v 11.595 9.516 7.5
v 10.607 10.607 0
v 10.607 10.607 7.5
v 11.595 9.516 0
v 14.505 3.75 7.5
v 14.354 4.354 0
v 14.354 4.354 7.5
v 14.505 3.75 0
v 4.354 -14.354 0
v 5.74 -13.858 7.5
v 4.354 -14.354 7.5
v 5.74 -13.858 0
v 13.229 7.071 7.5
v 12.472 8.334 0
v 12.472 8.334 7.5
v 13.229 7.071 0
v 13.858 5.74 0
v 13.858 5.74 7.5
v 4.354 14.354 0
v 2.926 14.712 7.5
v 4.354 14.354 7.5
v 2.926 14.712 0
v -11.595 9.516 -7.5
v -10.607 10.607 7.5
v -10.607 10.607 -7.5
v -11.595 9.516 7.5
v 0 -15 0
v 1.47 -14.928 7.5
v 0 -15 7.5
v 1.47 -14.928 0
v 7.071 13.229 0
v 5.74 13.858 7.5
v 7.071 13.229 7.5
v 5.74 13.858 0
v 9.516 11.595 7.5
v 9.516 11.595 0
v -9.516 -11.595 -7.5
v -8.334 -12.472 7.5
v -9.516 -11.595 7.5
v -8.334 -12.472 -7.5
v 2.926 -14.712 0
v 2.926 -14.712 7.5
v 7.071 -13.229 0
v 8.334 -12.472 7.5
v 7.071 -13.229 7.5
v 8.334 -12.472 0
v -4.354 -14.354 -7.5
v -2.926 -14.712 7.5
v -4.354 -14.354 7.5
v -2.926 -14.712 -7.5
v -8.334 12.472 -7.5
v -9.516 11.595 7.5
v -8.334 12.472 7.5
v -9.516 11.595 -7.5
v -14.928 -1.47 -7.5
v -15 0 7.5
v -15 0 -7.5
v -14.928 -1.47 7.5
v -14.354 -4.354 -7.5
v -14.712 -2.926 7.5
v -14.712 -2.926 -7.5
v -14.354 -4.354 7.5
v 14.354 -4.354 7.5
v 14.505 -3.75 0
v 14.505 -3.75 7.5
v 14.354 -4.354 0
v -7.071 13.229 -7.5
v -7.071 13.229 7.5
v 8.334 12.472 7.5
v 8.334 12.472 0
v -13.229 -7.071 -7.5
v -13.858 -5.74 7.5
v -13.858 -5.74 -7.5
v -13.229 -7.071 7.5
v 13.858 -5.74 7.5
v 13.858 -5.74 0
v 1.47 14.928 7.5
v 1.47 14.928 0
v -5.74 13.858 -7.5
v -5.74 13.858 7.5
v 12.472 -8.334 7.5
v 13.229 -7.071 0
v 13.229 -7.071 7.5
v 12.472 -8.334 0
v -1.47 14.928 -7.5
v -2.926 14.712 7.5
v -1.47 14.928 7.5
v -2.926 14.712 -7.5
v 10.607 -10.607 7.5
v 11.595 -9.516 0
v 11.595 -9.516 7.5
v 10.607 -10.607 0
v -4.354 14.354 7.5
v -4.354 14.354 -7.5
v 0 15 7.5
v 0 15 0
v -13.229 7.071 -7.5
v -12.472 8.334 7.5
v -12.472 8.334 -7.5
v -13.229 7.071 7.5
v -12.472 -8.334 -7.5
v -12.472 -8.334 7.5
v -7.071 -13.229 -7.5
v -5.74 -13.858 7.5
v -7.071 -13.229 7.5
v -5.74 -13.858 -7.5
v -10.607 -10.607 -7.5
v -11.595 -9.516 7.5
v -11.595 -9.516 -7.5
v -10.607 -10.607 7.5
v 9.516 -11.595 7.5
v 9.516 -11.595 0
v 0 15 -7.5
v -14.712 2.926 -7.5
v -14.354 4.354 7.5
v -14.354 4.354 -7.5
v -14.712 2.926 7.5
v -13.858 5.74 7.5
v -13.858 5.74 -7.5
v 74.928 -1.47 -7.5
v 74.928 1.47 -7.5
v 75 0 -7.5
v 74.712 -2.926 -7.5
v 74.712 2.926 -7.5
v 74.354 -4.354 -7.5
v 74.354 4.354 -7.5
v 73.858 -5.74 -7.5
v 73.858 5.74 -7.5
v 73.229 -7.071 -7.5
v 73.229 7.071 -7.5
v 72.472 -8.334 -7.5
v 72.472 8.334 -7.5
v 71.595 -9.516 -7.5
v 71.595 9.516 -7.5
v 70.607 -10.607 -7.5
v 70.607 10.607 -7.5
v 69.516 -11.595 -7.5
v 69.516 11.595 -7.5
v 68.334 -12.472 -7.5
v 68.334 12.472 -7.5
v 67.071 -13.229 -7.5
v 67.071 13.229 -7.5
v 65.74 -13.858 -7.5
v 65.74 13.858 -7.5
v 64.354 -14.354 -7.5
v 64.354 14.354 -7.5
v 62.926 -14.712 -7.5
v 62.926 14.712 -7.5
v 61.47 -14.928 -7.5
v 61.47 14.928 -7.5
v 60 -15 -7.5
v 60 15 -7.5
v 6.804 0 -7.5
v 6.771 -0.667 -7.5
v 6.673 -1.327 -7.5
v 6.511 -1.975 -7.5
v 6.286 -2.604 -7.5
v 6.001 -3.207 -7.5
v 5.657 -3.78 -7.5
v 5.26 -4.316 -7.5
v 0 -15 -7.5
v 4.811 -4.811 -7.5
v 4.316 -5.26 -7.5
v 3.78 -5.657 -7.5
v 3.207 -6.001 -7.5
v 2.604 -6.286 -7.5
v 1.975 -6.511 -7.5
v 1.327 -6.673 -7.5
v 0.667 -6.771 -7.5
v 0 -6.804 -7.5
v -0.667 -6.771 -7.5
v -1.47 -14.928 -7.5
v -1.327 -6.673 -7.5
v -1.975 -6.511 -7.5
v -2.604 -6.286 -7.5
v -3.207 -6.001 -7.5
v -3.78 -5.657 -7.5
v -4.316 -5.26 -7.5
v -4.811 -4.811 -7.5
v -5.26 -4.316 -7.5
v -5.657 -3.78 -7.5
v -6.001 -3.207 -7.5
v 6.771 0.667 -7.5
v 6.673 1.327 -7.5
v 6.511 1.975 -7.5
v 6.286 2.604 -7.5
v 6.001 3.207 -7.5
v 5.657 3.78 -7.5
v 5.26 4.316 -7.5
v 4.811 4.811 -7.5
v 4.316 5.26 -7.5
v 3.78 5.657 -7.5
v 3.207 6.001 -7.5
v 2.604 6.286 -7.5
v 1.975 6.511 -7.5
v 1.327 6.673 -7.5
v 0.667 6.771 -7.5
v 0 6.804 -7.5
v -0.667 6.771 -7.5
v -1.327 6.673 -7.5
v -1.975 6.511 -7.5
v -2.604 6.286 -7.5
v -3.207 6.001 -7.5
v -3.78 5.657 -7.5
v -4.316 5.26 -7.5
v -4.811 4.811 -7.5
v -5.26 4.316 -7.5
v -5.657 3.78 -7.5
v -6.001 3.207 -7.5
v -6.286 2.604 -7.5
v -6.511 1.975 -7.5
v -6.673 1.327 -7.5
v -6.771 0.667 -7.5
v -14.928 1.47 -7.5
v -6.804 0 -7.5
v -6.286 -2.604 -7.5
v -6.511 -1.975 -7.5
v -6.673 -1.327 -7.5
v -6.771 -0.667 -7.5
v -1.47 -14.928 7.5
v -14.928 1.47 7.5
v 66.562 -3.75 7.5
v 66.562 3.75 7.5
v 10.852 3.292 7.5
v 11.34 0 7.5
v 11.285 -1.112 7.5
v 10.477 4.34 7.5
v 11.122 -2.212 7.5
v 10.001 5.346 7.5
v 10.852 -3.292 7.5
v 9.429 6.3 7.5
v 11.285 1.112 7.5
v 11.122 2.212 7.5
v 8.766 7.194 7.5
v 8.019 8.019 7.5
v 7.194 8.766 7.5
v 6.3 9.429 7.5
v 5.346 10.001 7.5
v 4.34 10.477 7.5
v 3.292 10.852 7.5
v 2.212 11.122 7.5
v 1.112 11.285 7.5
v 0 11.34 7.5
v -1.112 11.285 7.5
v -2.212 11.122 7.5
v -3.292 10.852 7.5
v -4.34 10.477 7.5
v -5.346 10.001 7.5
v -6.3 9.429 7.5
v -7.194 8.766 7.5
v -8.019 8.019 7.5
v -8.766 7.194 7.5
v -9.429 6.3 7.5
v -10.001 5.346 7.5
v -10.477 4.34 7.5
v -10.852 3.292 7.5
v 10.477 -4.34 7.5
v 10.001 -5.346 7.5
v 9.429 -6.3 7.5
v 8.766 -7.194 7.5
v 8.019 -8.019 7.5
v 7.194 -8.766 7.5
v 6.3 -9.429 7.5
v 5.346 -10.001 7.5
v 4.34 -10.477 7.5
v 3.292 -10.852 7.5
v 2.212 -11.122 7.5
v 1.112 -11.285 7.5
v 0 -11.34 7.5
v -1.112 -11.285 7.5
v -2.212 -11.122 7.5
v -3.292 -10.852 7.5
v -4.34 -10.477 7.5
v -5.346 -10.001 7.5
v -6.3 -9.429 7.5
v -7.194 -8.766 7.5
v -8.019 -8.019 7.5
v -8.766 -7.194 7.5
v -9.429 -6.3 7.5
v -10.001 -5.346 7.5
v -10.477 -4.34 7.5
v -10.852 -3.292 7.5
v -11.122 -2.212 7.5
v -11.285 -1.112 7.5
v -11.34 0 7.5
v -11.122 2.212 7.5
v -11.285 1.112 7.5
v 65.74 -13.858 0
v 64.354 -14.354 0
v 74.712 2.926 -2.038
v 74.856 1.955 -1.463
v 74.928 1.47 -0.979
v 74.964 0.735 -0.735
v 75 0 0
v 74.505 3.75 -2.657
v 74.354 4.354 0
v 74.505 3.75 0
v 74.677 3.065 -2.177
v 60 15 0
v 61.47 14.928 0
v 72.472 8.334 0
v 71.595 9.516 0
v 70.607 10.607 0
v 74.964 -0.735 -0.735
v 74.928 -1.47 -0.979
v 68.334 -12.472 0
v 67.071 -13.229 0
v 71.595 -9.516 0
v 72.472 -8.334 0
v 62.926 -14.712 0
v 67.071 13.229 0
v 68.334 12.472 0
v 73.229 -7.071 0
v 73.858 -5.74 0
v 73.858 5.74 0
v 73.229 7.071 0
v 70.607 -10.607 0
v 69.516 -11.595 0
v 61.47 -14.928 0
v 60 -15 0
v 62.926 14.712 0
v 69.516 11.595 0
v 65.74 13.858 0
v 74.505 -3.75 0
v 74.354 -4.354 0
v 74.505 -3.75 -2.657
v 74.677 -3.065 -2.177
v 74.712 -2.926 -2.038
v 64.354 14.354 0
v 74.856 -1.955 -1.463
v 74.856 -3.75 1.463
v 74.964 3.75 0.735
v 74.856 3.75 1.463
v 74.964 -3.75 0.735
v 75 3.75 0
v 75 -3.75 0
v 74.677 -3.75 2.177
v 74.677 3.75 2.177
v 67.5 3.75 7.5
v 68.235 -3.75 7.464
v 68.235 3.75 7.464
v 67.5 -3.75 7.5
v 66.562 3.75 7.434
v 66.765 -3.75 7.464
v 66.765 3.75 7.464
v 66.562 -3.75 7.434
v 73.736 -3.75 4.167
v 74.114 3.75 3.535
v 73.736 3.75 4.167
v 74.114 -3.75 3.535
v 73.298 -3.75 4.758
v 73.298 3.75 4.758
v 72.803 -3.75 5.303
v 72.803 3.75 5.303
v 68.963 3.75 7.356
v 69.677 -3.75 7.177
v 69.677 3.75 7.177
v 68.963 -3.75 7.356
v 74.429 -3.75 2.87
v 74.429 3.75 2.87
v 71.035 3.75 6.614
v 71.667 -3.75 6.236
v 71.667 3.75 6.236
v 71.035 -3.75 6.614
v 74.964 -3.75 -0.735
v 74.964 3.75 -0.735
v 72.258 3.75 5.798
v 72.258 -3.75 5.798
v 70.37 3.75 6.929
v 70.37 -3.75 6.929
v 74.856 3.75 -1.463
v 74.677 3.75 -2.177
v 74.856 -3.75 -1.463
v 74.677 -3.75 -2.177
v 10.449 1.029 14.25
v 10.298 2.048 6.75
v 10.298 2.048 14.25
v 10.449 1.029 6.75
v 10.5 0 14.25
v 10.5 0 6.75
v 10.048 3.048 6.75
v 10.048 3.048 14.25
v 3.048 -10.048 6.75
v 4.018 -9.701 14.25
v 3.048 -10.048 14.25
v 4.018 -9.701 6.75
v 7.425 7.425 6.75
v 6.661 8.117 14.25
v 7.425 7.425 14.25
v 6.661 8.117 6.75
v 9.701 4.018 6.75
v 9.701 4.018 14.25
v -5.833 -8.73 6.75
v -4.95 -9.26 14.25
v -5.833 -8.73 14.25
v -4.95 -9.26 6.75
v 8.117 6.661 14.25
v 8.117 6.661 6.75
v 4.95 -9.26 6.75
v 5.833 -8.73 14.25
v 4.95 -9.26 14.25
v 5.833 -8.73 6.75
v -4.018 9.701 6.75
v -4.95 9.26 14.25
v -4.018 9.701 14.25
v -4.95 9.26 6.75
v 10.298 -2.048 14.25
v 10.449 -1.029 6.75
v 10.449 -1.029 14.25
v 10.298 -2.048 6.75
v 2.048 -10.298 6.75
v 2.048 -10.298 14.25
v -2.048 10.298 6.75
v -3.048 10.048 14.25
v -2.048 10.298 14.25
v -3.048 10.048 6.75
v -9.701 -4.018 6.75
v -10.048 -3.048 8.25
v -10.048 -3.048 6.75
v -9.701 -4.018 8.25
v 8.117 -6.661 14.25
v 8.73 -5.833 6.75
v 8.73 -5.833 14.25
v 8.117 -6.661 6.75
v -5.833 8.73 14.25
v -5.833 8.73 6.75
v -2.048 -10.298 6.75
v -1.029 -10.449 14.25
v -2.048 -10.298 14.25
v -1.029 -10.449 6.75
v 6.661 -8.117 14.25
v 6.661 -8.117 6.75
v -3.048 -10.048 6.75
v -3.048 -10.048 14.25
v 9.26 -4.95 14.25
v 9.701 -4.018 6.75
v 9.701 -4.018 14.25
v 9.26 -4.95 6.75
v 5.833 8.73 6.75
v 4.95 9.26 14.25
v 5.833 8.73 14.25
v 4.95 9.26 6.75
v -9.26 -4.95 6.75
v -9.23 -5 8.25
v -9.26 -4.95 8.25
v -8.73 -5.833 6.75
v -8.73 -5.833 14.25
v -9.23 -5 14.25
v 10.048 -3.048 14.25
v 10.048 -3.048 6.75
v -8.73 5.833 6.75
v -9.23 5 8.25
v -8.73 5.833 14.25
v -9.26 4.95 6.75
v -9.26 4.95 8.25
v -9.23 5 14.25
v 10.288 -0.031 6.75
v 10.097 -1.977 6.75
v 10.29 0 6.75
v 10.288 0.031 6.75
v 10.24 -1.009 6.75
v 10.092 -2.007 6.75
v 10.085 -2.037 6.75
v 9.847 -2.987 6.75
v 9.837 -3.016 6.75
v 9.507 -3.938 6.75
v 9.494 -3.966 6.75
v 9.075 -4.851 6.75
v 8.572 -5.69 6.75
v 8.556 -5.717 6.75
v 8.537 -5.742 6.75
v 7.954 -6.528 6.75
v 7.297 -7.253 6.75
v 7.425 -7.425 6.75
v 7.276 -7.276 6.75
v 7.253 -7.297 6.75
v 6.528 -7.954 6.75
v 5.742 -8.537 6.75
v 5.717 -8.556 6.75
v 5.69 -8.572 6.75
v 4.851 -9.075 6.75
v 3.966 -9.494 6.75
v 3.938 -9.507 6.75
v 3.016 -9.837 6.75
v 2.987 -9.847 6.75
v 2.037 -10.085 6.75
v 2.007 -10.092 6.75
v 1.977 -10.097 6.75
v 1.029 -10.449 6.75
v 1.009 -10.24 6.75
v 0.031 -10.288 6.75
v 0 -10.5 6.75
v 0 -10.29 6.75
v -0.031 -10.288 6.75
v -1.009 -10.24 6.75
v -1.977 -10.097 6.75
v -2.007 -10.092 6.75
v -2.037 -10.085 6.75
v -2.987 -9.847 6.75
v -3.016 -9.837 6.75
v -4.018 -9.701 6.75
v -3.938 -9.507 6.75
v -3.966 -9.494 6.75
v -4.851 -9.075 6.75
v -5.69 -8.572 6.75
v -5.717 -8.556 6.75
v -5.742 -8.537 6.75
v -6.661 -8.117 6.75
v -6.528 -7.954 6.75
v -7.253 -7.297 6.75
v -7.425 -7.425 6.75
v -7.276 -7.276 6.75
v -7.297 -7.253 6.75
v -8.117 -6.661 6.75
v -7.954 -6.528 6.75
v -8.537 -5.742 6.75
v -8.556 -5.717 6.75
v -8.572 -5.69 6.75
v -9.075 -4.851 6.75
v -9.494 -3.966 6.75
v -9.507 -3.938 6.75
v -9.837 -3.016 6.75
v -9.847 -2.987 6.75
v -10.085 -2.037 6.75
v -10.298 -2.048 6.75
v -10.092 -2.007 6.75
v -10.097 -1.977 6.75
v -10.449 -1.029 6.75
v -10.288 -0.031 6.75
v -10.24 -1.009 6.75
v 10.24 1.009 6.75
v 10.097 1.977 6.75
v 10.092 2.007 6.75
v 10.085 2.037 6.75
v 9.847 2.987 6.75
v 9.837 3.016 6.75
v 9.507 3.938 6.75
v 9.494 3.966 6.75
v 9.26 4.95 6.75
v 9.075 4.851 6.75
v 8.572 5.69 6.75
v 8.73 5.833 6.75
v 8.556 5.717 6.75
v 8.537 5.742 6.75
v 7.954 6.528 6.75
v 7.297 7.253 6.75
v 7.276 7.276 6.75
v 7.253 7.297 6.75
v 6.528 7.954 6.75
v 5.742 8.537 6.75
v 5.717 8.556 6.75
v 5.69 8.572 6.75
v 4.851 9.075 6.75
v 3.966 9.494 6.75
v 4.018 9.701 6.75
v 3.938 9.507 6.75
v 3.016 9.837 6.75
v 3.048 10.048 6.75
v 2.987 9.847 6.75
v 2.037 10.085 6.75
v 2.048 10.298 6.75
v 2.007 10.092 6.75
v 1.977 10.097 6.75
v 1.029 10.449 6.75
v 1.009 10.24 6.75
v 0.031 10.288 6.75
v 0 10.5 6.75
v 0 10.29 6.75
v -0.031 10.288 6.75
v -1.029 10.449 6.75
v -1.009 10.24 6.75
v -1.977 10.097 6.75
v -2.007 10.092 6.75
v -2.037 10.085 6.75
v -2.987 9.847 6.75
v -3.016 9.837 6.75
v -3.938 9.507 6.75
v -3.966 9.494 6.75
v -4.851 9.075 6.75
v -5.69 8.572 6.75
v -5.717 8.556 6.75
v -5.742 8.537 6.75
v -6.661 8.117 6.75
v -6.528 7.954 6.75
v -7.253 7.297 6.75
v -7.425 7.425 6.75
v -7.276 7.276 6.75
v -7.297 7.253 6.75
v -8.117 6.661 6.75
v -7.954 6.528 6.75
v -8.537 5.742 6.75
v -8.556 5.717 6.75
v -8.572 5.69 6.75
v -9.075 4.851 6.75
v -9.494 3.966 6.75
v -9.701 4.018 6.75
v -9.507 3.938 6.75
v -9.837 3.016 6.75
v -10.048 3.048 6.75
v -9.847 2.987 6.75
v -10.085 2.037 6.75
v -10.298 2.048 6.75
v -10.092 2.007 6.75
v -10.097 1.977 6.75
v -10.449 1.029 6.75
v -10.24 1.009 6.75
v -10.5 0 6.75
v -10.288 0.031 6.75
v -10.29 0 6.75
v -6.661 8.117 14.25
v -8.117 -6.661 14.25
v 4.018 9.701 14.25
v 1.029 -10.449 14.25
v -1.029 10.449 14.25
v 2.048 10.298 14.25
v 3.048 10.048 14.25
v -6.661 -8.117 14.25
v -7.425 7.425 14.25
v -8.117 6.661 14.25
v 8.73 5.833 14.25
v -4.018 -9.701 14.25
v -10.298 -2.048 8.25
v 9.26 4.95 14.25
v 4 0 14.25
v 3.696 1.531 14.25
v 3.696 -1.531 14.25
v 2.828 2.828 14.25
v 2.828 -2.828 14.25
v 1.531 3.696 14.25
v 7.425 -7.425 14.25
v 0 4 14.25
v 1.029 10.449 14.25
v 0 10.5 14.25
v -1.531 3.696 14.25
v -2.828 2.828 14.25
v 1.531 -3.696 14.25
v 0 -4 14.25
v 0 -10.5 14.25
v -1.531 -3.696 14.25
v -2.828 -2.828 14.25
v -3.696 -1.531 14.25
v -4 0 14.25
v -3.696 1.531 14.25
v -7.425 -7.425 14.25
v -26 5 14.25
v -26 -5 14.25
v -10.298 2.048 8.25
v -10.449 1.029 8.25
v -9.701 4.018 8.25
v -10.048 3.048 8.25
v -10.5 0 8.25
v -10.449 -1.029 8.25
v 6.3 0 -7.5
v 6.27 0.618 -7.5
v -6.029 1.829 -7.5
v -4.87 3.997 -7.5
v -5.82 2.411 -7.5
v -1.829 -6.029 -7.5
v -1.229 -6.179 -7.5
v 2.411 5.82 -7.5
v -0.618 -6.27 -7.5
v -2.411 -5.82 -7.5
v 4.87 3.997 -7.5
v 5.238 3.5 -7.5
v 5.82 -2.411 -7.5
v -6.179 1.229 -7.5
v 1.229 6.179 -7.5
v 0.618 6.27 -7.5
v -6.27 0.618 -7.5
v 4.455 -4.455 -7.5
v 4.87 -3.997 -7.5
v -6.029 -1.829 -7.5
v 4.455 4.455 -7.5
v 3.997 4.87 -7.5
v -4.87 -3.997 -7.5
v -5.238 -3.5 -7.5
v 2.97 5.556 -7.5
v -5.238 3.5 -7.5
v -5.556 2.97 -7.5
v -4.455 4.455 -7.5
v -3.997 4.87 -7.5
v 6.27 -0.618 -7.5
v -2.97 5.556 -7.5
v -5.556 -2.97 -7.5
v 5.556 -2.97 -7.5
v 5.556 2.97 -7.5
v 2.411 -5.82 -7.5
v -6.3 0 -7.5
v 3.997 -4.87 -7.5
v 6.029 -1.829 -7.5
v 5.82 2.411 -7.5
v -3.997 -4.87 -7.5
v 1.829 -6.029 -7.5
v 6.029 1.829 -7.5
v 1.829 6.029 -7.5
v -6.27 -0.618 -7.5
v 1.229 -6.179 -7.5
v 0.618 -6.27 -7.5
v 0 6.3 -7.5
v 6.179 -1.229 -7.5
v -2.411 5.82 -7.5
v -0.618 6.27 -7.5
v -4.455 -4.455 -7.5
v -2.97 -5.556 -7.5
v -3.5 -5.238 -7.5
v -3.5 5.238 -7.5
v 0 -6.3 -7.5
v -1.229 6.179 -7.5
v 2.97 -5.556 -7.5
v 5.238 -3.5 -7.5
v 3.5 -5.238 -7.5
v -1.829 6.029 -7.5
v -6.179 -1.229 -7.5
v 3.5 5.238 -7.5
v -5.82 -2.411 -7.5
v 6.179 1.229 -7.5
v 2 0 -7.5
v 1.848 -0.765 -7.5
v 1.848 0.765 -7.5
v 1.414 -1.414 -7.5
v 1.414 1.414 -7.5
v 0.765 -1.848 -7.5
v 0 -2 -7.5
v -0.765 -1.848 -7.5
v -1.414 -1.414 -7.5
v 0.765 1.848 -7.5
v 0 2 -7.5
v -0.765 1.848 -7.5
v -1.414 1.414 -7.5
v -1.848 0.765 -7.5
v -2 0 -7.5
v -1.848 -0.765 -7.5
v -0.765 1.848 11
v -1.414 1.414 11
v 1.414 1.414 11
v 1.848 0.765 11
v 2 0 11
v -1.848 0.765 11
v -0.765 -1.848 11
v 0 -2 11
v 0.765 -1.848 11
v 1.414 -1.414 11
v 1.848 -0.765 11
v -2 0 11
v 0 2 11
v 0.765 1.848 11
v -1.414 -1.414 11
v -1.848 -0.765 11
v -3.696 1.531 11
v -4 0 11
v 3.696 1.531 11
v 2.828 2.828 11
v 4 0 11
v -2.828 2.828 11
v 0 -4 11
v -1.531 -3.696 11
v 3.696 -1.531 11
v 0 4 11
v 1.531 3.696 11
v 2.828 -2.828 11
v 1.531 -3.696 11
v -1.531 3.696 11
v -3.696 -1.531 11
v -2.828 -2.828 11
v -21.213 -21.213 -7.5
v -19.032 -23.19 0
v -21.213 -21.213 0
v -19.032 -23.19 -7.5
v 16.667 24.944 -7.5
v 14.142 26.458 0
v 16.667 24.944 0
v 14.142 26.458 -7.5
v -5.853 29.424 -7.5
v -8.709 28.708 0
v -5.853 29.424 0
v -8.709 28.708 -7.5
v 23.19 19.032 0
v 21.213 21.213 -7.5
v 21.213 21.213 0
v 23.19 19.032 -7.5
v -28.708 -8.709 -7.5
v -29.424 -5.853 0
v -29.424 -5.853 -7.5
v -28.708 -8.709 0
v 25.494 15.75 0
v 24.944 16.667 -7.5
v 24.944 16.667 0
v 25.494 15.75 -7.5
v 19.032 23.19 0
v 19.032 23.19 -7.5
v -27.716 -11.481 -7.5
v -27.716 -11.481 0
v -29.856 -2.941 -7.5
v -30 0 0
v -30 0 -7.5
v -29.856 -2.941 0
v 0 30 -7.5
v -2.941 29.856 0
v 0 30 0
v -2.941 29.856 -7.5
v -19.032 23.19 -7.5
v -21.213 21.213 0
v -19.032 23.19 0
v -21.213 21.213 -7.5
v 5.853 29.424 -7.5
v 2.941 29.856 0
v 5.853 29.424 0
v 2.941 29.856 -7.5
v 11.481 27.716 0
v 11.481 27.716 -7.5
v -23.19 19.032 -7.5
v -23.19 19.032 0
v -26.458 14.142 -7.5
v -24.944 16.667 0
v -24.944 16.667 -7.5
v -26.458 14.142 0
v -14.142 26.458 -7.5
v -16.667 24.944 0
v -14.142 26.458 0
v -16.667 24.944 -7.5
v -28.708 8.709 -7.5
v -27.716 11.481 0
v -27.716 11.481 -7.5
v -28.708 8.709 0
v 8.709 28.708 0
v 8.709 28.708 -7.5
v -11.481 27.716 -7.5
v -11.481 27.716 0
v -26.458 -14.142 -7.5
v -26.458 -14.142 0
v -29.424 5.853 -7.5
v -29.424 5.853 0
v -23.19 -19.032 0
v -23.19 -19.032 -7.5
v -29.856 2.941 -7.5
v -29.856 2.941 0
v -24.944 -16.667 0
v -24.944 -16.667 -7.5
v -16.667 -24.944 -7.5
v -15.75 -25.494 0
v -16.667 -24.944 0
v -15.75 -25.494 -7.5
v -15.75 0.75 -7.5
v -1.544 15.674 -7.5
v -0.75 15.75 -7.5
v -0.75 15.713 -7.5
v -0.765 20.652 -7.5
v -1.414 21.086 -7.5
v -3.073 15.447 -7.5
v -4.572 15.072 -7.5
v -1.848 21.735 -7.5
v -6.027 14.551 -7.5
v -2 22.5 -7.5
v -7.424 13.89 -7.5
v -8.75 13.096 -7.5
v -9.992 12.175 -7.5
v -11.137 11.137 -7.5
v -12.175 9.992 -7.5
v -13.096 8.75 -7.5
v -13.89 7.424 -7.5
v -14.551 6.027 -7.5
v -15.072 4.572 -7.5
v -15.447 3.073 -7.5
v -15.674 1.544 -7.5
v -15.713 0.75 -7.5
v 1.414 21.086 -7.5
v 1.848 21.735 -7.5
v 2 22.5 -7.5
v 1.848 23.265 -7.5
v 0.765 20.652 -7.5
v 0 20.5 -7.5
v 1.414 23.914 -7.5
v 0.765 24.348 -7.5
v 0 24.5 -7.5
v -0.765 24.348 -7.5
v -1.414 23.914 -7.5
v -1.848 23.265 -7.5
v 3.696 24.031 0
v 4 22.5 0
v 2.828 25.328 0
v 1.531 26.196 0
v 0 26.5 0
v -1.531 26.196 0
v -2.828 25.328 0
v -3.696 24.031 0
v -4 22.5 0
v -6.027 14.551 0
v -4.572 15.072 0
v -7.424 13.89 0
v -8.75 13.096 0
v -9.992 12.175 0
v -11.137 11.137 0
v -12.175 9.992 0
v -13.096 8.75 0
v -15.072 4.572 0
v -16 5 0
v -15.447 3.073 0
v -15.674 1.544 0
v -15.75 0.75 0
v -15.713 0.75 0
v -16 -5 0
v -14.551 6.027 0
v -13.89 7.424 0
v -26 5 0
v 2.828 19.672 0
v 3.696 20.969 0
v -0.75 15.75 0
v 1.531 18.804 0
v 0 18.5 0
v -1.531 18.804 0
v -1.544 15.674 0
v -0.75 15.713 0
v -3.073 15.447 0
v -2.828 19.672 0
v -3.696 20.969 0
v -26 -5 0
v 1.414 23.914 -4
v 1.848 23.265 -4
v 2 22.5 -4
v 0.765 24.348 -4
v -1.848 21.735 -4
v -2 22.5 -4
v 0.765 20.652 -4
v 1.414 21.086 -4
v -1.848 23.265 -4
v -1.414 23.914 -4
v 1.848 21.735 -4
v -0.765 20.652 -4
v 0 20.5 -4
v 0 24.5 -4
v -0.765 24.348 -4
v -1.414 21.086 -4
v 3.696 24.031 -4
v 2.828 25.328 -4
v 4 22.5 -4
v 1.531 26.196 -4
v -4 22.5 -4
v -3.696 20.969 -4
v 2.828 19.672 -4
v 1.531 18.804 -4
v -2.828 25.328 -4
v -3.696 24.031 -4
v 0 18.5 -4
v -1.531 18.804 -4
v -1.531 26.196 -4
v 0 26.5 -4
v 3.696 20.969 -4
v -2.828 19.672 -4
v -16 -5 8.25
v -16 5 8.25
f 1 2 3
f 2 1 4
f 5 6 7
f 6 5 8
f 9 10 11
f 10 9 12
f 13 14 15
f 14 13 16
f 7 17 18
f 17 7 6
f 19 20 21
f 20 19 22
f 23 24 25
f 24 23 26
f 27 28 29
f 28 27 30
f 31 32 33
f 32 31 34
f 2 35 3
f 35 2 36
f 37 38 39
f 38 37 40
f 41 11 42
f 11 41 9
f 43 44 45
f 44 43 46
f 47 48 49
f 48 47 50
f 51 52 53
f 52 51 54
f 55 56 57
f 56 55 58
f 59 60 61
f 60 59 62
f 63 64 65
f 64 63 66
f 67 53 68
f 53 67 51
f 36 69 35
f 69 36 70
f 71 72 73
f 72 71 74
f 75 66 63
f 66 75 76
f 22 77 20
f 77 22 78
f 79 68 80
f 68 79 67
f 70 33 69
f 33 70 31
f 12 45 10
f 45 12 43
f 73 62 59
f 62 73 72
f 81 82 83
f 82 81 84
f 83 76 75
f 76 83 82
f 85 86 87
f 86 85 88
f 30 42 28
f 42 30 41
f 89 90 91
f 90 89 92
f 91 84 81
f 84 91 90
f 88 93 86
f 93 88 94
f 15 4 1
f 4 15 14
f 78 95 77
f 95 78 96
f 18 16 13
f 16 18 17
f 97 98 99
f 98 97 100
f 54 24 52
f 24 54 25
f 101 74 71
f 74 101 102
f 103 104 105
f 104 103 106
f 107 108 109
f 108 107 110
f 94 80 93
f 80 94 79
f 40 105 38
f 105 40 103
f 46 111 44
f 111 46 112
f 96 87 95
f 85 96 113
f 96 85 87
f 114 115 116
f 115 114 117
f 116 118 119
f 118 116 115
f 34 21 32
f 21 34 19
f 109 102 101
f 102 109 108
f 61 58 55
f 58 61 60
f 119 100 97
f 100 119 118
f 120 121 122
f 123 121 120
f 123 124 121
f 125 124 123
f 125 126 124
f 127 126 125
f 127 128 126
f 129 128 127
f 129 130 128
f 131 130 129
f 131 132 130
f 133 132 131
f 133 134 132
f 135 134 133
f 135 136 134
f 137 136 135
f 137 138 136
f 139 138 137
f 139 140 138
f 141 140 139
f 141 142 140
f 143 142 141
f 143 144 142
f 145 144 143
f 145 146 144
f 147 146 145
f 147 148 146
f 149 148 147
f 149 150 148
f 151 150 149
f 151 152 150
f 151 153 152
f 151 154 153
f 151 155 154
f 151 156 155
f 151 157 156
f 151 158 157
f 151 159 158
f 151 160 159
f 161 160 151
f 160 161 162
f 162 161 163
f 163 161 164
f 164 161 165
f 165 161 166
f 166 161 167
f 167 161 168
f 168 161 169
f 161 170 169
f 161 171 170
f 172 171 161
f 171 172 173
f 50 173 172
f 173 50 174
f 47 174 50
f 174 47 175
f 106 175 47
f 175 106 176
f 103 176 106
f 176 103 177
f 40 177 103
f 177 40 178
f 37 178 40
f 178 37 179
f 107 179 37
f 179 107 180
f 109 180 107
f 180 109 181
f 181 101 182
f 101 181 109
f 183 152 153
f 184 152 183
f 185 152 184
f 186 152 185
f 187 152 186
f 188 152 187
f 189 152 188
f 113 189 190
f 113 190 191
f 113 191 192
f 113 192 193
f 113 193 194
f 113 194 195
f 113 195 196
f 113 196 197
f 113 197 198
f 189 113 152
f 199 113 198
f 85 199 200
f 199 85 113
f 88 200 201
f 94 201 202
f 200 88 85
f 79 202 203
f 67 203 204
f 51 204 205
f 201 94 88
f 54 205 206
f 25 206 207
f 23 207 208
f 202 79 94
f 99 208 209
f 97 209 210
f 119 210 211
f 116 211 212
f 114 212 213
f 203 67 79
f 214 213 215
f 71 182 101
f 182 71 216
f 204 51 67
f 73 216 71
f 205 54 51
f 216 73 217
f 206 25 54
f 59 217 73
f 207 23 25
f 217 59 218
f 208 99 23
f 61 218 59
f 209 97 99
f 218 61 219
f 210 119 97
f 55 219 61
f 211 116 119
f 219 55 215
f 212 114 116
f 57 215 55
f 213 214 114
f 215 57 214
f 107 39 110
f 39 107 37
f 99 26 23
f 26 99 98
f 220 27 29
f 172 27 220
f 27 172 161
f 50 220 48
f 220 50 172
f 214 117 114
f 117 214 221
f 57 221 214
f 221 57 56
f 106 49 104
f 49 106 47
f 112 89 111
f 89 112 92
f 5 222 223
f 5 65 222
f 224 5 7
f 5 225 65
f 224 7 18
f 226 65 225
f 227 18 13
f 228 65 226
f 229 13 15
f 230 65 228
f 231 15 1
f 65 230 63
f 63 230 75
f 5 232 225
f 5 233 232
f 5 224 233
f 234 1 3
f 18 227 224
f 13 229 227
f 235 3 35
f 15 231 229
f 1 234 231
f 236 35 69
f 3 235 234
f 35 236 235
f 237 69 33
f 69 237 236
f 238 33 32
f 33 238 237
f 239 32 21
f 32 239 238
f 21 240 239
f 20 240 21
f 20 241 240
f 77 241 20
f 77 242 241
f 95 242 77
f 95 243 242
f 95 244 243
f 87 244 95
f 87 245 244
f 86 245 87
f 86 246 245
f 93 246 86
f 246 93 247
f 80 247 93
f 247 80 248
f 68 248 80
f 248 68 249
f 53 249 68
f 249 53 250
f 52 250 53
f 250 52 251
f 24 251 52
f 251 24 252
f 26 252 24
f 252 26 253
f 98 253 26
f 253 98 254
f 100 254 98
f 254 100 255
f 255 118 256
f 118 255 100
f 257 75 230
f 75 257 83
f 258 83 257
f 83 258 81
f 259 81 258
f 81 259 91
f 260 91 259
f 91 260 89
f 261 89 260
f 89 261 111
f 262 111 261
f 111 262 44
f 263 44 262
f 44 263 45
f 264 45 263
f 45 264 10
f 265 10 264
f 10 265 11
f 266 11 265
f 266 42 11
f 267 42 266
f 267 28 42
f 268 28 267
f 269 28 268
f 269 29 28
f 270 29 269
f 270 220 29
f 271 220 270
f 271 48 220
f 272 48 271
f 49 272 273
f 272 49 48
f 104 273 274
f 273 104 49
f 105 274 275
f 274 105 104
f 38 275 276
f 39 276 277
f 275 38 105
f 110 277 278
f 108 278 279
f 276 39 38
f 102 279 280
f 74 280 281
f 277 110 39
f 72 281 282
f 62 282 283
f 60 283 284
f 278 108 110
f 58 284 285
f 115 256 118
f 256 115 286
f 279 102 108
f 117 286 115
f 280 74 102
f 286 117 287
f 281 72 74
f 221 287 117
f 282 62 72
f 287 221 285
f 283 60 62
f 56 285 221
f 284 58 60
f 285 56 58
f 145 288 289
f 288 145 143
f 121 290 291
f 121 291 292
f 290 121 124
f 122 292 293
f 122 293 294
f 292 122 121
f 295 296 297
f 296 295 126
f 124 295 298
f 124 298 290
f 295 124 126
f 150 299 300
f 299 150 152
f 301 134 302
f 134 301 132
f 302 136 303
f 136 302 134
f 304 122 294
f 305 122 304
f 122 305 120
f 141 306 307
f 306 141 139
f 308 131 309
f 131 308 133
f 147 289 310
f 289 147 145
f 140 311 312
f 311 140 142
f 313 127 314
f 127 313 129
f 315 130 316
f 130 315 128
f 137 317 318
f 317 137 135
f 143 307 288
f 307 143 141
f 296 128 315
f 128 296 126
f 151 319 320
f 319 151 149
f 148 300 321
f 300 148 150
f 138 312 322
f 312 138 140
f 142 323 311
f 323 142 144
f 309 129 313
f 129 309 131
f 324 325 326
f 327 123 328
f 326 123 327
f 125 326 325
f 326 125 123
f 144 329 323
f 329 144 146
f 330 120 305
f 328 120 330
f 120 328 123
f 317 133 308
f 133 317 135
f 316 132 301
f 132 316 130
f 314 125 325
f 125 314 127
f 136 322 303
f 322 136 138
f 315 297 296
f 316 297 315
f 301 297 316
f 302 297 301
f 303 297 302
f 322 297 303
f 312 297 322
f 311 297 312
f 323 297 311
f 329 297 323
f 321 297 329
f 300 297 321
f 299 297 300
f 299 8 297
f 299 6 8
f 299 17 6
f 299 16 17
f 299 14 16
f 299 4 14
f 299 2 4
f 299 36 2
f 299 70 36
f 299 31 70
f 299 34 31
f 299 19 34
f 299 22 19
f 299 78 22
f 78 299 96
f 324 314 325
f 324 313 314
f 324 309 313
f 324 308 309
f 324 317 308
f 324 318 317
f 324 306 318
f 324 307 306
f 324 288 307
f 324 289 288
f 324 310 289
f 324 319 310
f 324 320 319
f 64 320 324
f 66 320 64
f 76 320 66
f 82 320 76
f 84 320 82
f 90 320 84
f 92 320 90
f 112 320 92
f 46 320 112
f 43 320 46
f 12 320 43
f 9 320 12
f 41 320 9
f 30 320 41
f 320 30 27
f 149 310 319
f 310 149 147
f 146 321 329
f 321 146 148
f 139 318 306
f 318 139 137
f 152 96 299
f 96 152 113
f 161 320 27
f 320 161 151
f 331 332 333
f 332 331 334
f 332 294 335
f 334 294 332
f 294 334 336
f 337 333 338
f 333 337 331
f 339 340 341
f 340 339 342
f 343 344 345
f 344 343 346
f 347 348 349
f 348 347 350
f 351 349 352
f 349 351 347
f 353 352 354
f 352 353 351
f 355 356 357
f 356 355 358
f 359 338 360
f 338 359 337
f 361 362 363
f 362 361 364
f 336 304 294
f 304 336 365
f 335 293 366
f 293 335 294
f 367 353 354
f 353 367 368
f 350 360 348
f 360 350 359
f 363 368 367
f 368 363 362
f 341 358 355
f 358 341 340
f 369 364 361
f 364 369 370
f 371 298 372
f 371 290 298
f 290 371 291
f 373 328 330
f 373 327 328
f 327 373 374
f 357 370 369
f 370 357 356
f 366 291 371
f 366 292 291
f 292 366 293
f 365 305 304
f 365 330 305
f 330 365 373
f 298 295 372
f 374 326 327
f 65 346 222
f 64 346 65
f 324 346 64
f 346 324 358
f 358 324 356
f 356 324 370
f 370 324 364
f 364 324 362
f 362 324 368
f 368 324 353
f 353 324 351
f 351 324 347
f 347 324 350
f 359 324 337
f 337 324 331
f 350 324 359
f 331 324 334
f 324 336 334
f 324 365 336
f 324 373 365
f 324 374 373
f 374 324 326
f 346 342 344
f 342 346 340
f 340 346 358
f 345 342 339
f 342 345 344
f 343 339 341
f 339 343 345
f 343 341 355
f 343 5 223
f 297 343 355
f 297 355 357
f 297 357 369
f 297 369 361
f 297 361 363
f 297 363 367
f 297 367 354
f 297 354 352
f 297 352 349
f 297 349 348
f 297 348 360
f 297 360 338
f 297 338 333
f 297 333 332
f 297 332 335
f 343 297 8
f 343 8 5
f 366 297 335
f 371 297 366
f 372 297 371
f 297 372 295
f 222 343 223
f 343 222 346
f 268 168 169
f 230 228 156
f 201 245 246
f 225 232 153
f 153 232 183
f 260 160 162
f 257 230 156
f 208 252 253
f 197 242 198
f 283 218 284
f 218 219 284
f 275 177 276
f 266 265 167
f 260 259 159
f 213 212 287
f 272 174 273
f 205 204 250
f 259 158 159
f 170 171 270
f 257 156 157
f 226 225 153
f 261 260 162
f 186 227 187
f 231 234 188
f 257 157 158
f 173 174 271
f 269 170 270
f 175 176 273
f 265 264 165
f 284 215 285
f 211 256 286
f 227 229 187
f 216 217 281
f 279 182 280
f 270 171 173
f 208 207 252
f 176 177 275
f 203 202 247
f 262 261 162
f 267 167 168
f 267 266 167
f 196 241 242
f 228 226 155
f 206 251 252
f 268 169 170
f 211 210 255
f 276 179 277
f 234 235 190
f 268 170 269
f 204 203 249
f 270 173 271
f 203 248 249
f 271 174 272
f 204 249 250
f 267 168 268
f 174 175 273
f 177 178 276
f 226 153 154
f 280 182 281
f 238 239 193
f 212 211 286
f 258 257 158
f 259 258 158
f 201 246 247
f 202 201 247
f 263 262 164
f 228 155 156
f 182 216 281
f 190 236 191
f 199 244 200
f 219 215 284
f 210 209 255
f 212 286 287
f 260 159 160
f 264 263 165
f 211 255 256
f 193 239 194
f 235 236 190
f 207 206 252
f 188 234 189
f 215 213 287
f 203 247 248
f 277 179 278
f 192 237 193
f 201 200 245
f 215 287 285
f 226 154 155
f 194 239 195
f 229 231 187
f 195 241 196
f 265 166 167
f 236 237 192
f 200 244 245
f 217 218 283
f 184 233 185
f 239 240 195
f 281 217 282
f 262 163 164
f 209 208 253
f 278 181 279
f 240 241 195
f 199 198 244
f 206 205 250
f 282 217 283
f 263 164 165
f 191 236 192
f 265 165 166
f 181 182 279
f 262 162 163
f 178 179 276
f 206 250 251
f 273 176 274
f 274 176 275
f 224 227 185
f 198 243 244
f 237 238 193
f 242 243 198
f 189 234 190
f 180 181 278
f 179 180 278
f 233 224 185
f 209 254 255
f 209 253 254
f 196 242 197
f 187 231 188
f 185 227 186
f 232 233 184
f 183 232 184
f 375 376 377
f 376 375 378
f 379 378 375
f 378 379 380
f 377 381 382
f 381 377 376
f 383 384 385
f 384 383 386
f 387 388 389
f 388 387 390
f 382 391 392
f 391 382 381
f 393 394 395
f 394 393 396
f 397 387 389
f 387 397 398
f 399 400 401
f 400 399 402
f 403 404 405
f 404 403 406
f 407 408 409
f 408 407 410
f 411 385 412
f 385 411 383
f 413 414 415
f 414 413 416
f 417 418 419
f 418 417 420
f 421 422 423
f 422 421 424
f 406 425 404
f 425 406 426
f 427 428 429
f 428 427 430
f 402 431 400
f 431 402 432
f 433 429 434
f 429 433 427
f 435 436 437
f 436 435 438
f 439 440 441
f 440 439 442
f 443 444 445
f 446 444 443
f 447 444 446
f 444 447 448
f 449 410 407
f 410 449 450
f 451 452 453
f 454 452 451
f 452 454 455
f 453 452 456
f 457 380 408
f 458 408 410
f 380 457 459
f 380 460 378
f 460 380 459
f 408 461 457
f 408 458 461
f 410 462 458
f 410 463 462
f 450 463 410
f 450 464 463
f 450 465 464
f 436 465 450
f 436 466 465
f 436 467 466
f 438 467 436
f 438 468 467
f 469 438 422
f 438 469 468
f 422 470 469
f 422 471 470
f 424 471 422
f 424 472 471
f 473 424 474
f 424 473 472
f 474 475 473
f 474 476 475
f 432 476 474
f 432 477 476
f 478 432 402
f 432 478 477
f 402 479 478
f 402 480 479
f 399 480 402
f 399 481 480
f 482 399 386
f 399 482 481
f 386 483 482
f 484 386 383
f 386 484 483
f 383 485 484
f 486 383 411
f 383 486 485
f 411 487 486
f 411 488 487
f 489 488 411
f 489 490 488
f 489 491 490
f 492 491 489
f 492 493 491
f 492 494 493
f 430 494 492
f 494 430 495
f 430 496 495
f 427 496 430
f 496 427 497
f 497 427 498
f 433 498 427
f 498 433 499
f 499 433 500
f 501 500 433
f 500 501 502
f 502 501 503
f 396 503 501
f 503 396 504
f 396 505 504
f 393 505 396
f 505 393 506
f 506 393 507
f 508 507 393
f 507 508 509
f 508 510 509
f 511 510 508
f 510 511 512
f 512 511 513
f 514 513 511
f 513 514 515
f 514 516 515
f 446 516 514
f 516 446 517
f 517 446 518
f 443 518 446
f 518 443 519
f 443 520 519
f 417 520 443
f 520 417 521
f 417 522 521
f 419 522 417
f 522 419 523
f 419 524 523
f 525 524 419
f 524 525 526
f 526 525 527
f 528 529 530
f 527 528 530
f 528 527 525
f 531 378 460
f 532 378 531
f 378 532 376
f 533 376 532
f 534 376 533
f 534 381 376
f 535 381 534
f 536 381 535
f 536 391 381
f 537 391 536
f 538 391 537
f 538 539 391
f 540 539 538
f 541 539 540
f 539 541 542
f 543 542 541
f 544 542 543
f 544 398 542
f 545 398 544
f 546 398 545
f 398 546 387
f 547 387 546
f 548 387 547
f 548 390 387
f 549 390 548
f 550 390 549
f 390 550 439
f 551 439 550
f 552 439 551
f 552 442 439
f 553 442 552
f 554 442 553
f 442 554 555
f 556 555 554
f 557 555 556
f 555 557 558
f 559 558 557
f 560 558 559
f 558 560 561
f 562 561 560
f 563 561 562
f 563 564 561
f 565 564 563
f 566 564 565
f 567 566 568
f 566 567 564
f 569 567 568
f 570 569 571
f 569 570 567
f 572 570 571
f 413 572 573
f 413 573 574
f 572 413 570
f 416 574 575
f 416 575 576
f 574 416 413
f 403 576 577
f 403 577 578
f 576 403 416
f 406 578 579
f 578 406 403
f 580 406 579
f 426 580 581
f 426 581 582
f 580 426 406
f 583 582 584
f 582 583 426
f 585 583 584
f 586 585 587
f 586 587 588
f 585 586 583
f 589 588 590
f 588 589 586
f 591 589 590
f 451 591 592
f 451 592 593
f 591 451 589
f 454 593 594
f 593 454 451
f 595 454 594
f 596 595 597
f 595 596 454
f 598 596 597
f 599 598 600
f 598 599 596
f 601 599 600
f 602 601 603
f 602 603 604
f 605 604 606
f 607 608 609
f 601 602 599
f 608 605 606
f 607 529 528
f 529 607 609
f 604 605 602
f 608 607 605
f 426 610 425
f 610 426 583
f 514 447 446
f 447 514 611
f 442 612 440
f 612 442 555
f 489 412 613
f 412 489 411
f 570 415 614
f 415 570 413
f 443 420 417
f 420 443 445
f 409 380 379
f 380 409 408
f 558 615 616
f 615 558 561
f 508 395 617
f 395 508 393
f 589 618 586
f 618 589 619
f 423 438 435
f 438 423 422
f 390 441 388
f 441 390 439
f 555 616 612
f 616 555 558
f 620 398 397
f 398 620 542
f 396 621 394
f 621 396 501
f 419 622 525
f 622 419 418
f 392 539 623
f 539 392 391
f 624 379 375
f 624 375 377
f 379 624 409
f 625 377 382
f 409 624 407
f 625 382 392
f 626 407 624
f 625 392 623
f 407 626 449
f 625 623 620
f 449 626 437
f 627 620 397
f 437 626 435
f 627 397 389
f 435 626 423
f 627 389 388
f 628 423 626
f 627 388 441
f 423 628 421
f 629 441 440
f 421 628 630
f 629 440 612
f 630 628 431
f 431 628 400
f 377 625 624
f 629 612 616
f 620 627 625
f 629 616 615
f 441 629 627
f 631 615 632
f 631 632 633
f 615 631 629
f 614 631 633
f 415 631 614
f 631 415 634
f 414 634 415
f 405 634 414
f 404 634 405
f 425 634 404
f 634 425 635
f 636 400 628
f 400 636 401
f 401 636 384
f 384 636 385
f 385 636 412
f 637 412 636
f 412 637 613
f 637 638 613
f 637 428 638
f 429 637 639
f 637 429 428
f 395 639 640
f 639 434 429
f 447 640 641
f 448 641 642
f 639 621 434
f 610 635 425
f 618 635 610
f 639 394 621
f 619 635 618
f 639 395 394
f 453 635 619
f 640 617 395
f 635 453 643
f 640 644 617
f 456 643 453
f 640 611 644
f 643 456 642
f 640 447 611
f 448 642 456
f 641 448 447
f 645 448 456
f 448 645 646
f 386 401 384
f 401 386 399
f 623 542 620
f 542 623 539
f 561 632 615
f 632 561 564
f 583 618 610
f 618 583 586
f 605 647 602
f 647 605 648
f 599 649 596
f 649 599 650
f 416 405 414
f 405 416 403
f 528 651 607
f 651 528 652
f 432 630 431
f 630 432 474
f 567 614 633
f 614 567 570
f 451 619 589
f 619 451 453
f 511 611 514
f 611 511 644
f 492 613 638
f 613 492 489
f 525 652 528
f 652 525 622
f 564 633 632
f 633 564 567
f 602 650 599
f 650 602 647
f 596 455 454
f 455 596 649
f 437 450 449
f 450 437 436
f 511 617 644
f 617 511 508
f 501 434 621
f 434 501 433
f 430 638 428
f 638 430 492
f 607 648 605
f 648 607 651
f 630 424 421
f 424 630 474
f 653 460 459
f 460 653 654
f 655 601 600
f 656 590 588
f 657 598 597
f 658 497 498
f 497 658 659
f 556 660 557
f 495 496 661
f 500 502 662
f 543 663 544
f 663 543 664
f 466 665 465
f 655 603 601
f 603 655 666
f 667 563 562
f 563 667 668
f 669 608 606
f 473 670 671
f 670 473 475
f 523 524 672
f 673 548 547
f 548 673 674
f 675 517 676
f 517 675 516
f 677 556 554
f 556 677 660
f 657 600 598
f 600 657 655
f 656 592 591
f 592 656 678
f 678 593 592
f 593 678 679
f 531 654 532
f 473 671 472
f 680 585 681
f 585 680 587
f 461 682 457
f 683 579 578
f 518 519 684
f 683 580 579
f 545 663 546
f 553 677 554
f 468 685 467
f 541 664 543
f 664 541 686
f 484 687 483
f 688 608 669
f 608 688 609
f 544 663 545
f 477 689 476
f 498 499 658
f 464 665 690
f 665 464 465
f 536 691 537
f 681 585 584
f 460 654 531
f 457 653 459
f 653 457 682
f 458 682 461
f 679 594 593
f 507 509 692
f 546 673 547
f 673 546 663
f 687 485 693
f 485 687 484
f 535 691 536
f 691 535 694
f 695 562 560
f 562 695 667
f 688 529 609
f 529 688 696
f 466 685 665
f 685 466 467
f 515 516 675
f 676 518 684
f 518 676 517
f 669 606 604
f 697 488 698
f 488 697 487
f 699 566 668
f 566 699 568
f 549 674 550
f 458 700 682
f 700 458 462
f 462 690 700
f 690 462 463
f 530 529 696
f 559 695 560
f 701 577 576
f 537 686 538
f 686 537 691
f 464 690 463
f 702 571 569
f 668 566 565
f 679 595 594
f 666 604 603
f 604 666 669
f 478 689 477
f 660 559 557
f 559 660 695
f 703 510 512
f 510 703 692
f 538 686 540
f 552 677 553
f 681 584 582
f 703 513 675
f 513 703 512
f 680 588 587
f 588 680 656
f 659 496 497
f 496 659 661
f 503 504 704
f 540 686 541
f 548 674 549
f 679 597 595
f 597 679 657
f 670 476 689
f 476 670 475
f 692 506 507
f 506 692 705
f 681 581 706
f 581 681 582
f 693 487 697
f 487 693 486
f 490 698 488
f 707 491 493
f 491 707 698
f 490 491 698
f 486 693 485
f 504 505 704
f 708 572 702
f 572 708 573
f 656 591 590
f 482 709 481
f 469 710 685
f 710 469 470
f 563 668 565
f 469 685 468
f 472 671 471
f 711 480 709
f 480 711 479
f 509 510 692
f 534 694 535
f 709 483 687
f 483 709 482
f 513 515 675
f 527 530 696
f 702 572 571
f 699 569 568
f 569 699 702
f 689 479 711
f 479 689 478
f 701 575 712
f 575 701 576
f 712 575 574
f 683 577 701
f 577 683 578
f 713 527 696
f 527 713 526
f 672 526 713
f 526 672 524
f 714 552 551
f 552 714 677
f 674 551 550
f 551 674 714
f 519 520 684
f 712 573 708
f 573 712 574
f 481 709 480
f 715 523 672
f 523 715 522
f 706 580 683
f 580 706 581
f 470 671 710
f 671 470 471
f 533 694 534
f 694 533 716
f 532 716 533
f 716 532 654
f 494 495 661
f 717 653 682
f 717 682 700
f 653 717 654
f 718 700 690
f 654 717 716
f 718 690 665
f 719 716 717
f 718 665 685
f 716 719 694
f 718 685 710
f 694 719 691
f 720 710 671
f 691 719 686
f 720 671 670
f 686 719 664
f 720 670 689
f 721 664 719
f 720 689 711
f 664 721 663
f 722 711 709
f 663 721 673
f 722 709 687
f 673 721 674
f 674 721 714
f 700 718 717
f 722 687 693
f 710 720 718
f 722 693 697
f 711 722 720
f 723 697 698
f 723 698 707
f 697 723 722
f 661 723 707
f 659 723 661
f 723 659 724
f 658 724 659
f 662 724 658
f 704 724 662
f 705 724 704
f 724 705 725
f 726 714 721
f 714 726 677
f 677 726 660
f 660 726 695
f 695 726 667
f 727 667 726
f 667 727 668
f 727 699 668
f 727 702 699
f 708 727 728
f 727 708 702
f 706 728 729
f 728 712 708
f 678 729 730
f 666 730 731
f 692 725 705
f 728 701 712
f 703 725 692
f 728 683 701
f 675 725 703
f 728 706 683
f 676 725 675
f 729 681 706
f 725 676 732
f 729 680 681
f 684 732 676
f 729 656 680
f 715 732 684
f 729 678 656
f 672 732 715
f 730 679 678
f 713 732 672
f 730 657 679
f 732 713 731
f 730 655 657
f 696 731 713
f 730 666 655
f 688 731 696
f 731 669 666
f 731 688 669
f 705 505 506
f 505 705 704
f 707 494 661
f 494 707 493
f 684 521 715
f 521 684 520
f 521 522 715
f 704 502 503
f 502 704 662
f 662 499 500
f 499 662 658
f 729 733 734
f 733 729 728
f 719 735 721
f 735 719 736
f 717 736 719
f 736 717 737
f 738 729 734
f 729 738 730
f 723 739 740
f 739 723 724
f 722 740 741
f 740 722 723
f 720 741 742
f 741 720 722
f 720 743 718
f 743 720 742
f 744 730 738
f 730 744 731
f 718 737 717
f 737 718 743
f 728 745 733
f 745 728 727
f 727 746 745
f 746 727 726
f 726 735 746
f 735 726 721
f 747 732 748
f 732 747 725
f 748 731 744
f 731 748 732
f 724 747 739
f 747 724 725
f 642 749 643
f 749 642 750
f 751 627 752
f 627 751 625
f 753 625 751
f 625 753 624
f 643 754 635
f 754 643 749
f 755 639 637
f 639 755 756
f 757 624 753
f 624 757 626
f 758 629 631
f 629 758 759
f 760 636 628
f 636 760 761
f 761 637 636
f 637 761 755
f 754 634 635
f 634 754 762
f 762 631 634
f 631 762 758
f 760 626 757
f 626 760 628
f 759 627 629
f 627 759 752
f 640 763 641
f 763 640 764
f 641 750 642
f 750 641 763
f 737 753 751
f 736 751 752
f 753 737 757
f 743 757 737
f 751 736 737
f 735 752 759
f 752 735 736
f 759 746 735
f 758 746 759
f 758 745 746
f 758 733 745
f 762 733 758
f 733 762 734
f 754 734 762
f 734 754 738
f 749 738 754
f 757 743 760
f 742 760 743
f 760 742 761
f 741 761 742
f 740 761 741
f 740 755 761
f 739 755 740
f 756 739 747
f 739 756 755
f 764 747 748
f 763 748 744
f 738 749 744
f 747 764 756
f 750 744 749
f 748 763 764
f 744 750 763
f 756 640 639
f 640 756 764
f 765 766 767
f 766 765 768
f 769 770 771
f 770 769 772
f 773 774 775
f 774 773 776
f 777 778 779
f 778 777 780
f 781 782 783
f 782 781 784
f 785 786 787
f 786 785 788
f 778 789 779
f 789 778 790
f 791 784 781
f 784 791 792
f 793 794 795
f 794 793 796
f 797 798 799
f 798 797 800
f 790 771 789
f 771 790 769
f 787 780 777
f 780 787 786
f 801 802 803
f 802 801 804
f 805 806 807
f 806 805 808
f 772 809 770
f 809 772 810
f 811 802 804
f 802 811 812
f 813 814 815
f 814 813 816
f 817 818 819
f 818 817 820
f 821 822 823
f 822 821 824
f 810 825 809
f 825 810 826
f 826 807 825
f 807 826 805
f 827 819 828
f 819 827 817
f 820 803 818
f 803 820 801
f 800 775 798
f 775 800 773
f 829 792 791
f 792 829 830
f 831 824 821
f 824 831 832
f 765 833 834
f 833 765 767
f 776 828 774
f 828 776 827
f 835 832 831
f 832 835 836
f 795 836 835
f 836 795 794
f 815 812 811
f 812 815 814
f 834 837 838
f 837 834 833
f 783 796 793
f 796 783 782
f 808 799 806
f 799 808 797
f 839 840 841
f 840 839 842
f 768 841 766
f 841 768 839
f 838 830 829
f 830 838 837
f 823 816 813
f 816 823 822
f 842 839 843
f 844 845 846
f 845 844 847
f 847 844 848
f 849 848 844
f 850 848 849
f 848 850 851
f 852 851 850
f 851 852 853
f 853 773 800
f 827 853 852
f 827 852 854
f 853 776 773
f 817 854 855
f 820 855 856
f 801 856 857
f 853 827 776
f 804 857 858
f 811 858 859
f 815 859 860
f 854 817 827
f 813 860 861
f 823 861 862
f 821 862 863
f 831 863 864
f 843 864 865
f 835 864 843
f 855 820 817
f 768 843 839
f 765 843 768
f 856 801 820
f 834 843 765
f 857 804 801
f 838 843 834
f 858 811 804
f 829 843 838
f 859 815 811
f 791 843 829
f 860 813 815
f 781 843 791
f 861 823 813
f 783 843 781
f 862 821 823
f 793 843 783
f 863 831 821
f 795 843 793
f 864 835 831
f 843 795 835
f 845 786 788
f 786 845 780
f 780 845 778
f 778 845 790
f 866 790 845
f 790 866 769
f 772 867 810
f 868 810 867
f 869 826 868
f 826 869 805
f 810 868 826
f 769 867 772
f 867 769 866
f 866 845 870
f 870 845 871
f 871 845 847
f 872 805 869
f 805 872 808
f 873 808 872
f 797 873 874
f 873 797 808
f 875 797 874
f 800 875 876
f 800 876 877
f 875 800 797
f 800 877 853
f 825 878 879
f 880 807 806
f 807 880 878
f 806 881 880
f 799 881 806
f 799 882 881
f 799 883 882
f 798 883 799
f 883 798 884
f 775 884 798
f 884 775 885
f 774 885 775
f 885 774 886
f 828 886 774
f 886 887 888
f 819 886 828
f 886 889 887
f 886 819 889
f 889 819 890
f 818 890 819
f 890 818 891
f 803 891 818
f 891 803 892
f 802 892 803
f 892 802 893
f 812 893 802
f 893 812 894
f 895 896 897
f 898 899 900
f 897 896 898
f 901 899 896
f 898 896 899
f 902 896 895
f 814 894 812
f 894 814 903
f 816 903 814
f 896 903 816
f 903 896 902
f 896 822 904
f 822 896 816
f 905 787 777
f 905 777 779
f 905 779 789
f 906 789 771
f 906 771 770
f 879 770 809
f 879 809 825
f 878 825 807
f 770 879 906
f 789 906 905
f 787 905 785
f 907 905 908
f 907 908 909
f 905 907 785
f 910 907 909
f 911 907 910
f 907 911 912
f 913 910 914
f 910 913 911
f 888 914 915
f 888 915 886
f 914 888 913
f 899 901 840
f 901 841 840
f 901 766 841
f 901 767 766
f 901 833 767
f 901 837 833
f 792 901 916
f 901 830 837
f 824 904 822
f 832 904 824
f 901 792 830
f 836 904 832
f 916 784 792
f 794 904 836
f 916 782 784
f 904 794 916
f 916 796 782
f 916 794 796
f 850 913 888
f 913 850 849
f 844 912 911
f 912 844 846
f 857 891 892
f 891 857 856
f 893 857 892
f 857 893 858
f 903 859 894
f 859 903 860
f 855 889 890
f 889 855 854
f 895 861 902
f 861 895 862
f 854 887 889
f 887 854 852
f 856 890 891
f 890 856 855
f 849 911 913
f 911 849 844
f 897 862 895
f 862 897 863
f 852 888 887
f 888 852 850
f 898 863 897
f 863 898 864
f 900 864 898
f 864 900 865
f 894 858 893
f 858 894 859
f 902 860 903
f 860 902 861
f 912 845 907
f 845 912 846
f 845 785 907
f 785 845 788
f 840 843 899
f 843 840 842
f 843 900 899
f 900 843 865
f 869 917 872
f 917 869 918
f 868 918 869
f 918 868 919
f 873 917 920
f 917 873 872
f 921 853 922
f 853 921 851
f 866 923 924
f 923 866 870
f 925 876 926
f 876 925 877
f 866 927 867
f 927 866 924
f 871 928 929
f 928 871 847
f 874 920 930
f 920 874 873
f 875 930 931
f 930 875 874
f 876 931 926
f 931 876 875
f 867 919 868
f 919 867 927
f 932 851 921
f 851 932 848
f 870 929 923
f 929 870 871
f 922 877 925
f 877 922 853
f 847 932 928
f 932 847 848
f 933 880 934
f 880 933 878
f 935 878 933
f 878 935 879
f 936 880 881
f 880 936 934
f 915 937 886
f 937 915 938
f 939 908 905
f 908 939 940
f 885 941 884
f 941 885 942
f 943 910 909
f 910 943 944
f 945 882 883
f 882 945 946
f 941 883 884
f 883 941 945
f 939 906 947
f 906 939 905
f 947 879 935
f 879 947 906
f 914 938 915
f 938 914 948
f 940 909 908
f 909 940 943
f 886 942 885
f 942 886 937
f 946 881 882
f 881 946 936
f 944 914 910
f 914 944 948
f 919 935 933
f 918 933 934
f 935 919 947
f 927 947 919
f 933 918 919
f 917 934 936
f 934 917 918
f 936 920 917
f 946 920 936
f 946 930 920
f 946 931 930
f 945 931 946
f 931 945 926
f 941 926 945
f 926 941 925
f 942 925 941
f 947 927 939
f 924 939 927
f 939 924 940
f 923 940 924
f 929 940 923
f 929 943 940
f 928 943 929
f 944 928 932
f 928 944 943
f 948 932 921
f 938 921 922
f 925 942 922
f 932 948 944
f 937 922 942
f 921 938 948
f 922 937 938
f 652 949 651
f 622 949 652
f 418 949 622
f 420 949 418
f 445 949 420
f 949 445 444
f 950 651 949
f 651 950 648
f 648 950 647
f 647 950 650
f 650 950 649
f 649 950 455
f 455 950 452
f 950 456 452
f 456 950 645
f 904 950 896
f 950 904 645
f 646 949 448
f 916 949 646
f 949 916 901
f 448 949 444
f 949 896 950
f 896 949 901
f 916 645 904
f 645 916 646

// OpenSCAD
$fn=64;

width=30;
height=15;
length=60;

washerWidth= width*0.7;
screwDiam=4;
screwDiamBottom=screwDiam;
countersink=4;

all();
//mirror([1,0,0]) all(); 

module all() {
    union() {
    latch();
    washer(washerWidth/2);
    stopper();
    }
}

module stopper() {
    difference() {
        translate([0, 0, -height/4]) cylinder(h = height/2, d = width * 2, center = true);
        translate([0, 0, -height/4]) cylinder(h = height, d = width * 1.05, center = true);
        translate([width/2, 0, -height/4]) cube([width* 1.05, width* 1.05, height/2], center = true);
        
        translate([0, -width/2, -height/4]) rotate([0, 0, 90]) cube([width* 1.05, width* 1.05, height/2], center = true);  
        translate([width/2, -width/2, -height/4]) cube([width, width, height/2], center = true); 
        
        // Bottom hole
        translate([0, width*.75, 0]) cylinder(h = height, d = screwDiamBottom, center = true, $fn=16);
        // Countersink 
        translate([0, width*.75, -countersink/2]) cylinder(h = countersink, d = screwDiam * 2, center = true, $fn=16);
    }
    
    translate([-width * 0.4, 0, height * 0.75]) cube([width/3, width/3, height * 0.4], center=true);
    translate([-width * 0.7, 0, height * 0.25]) cube([width/3, width/3, height * 1.4], center=true);
}

module latch() {
    difference() {
        union() {
            cylinder(h = height, d = width, center = true);
            translate([length, 0, -height/4]) cylinder(h = height/2, d = width, center = true);
            translate([length/2, 0, - height/4]) cube([length, width, height/2], center = true);
    
            translate([length + width/2 - height/2, 0, 0 ]) rotate([90, 0, 0]) cylinder(h = height/2, d = height, center = true);
            translate([(length + width - height)/2, 0, height/4]) cube([length - height/ 8, height/2, height/2], center = true);
        }
        baseWasher(washerWidth * 1.08 / 2);
    }
}

module baseWasher(radius) {
    cylinder(h = height, r1 = radius*0.6, r2 = radius, center = true);
}

module washer(radius) {
    difference() {
        union() {
            translate([0, 0, height*0.7]) cylinder(h = height/2, r = radius, center = true);
            cylinder(h = height, r1 = radius*0.6, r2 = radius, center = true);
        }
        // Hole
        cylinder(h = height * 2, d = screwDiam, center = true, $fn=16);
        // Countersink
        translate([0, 0, height]) cylinder(h = countersink * 2, d = screwDiam * 2, center = true, $fn=16);
    }
}
